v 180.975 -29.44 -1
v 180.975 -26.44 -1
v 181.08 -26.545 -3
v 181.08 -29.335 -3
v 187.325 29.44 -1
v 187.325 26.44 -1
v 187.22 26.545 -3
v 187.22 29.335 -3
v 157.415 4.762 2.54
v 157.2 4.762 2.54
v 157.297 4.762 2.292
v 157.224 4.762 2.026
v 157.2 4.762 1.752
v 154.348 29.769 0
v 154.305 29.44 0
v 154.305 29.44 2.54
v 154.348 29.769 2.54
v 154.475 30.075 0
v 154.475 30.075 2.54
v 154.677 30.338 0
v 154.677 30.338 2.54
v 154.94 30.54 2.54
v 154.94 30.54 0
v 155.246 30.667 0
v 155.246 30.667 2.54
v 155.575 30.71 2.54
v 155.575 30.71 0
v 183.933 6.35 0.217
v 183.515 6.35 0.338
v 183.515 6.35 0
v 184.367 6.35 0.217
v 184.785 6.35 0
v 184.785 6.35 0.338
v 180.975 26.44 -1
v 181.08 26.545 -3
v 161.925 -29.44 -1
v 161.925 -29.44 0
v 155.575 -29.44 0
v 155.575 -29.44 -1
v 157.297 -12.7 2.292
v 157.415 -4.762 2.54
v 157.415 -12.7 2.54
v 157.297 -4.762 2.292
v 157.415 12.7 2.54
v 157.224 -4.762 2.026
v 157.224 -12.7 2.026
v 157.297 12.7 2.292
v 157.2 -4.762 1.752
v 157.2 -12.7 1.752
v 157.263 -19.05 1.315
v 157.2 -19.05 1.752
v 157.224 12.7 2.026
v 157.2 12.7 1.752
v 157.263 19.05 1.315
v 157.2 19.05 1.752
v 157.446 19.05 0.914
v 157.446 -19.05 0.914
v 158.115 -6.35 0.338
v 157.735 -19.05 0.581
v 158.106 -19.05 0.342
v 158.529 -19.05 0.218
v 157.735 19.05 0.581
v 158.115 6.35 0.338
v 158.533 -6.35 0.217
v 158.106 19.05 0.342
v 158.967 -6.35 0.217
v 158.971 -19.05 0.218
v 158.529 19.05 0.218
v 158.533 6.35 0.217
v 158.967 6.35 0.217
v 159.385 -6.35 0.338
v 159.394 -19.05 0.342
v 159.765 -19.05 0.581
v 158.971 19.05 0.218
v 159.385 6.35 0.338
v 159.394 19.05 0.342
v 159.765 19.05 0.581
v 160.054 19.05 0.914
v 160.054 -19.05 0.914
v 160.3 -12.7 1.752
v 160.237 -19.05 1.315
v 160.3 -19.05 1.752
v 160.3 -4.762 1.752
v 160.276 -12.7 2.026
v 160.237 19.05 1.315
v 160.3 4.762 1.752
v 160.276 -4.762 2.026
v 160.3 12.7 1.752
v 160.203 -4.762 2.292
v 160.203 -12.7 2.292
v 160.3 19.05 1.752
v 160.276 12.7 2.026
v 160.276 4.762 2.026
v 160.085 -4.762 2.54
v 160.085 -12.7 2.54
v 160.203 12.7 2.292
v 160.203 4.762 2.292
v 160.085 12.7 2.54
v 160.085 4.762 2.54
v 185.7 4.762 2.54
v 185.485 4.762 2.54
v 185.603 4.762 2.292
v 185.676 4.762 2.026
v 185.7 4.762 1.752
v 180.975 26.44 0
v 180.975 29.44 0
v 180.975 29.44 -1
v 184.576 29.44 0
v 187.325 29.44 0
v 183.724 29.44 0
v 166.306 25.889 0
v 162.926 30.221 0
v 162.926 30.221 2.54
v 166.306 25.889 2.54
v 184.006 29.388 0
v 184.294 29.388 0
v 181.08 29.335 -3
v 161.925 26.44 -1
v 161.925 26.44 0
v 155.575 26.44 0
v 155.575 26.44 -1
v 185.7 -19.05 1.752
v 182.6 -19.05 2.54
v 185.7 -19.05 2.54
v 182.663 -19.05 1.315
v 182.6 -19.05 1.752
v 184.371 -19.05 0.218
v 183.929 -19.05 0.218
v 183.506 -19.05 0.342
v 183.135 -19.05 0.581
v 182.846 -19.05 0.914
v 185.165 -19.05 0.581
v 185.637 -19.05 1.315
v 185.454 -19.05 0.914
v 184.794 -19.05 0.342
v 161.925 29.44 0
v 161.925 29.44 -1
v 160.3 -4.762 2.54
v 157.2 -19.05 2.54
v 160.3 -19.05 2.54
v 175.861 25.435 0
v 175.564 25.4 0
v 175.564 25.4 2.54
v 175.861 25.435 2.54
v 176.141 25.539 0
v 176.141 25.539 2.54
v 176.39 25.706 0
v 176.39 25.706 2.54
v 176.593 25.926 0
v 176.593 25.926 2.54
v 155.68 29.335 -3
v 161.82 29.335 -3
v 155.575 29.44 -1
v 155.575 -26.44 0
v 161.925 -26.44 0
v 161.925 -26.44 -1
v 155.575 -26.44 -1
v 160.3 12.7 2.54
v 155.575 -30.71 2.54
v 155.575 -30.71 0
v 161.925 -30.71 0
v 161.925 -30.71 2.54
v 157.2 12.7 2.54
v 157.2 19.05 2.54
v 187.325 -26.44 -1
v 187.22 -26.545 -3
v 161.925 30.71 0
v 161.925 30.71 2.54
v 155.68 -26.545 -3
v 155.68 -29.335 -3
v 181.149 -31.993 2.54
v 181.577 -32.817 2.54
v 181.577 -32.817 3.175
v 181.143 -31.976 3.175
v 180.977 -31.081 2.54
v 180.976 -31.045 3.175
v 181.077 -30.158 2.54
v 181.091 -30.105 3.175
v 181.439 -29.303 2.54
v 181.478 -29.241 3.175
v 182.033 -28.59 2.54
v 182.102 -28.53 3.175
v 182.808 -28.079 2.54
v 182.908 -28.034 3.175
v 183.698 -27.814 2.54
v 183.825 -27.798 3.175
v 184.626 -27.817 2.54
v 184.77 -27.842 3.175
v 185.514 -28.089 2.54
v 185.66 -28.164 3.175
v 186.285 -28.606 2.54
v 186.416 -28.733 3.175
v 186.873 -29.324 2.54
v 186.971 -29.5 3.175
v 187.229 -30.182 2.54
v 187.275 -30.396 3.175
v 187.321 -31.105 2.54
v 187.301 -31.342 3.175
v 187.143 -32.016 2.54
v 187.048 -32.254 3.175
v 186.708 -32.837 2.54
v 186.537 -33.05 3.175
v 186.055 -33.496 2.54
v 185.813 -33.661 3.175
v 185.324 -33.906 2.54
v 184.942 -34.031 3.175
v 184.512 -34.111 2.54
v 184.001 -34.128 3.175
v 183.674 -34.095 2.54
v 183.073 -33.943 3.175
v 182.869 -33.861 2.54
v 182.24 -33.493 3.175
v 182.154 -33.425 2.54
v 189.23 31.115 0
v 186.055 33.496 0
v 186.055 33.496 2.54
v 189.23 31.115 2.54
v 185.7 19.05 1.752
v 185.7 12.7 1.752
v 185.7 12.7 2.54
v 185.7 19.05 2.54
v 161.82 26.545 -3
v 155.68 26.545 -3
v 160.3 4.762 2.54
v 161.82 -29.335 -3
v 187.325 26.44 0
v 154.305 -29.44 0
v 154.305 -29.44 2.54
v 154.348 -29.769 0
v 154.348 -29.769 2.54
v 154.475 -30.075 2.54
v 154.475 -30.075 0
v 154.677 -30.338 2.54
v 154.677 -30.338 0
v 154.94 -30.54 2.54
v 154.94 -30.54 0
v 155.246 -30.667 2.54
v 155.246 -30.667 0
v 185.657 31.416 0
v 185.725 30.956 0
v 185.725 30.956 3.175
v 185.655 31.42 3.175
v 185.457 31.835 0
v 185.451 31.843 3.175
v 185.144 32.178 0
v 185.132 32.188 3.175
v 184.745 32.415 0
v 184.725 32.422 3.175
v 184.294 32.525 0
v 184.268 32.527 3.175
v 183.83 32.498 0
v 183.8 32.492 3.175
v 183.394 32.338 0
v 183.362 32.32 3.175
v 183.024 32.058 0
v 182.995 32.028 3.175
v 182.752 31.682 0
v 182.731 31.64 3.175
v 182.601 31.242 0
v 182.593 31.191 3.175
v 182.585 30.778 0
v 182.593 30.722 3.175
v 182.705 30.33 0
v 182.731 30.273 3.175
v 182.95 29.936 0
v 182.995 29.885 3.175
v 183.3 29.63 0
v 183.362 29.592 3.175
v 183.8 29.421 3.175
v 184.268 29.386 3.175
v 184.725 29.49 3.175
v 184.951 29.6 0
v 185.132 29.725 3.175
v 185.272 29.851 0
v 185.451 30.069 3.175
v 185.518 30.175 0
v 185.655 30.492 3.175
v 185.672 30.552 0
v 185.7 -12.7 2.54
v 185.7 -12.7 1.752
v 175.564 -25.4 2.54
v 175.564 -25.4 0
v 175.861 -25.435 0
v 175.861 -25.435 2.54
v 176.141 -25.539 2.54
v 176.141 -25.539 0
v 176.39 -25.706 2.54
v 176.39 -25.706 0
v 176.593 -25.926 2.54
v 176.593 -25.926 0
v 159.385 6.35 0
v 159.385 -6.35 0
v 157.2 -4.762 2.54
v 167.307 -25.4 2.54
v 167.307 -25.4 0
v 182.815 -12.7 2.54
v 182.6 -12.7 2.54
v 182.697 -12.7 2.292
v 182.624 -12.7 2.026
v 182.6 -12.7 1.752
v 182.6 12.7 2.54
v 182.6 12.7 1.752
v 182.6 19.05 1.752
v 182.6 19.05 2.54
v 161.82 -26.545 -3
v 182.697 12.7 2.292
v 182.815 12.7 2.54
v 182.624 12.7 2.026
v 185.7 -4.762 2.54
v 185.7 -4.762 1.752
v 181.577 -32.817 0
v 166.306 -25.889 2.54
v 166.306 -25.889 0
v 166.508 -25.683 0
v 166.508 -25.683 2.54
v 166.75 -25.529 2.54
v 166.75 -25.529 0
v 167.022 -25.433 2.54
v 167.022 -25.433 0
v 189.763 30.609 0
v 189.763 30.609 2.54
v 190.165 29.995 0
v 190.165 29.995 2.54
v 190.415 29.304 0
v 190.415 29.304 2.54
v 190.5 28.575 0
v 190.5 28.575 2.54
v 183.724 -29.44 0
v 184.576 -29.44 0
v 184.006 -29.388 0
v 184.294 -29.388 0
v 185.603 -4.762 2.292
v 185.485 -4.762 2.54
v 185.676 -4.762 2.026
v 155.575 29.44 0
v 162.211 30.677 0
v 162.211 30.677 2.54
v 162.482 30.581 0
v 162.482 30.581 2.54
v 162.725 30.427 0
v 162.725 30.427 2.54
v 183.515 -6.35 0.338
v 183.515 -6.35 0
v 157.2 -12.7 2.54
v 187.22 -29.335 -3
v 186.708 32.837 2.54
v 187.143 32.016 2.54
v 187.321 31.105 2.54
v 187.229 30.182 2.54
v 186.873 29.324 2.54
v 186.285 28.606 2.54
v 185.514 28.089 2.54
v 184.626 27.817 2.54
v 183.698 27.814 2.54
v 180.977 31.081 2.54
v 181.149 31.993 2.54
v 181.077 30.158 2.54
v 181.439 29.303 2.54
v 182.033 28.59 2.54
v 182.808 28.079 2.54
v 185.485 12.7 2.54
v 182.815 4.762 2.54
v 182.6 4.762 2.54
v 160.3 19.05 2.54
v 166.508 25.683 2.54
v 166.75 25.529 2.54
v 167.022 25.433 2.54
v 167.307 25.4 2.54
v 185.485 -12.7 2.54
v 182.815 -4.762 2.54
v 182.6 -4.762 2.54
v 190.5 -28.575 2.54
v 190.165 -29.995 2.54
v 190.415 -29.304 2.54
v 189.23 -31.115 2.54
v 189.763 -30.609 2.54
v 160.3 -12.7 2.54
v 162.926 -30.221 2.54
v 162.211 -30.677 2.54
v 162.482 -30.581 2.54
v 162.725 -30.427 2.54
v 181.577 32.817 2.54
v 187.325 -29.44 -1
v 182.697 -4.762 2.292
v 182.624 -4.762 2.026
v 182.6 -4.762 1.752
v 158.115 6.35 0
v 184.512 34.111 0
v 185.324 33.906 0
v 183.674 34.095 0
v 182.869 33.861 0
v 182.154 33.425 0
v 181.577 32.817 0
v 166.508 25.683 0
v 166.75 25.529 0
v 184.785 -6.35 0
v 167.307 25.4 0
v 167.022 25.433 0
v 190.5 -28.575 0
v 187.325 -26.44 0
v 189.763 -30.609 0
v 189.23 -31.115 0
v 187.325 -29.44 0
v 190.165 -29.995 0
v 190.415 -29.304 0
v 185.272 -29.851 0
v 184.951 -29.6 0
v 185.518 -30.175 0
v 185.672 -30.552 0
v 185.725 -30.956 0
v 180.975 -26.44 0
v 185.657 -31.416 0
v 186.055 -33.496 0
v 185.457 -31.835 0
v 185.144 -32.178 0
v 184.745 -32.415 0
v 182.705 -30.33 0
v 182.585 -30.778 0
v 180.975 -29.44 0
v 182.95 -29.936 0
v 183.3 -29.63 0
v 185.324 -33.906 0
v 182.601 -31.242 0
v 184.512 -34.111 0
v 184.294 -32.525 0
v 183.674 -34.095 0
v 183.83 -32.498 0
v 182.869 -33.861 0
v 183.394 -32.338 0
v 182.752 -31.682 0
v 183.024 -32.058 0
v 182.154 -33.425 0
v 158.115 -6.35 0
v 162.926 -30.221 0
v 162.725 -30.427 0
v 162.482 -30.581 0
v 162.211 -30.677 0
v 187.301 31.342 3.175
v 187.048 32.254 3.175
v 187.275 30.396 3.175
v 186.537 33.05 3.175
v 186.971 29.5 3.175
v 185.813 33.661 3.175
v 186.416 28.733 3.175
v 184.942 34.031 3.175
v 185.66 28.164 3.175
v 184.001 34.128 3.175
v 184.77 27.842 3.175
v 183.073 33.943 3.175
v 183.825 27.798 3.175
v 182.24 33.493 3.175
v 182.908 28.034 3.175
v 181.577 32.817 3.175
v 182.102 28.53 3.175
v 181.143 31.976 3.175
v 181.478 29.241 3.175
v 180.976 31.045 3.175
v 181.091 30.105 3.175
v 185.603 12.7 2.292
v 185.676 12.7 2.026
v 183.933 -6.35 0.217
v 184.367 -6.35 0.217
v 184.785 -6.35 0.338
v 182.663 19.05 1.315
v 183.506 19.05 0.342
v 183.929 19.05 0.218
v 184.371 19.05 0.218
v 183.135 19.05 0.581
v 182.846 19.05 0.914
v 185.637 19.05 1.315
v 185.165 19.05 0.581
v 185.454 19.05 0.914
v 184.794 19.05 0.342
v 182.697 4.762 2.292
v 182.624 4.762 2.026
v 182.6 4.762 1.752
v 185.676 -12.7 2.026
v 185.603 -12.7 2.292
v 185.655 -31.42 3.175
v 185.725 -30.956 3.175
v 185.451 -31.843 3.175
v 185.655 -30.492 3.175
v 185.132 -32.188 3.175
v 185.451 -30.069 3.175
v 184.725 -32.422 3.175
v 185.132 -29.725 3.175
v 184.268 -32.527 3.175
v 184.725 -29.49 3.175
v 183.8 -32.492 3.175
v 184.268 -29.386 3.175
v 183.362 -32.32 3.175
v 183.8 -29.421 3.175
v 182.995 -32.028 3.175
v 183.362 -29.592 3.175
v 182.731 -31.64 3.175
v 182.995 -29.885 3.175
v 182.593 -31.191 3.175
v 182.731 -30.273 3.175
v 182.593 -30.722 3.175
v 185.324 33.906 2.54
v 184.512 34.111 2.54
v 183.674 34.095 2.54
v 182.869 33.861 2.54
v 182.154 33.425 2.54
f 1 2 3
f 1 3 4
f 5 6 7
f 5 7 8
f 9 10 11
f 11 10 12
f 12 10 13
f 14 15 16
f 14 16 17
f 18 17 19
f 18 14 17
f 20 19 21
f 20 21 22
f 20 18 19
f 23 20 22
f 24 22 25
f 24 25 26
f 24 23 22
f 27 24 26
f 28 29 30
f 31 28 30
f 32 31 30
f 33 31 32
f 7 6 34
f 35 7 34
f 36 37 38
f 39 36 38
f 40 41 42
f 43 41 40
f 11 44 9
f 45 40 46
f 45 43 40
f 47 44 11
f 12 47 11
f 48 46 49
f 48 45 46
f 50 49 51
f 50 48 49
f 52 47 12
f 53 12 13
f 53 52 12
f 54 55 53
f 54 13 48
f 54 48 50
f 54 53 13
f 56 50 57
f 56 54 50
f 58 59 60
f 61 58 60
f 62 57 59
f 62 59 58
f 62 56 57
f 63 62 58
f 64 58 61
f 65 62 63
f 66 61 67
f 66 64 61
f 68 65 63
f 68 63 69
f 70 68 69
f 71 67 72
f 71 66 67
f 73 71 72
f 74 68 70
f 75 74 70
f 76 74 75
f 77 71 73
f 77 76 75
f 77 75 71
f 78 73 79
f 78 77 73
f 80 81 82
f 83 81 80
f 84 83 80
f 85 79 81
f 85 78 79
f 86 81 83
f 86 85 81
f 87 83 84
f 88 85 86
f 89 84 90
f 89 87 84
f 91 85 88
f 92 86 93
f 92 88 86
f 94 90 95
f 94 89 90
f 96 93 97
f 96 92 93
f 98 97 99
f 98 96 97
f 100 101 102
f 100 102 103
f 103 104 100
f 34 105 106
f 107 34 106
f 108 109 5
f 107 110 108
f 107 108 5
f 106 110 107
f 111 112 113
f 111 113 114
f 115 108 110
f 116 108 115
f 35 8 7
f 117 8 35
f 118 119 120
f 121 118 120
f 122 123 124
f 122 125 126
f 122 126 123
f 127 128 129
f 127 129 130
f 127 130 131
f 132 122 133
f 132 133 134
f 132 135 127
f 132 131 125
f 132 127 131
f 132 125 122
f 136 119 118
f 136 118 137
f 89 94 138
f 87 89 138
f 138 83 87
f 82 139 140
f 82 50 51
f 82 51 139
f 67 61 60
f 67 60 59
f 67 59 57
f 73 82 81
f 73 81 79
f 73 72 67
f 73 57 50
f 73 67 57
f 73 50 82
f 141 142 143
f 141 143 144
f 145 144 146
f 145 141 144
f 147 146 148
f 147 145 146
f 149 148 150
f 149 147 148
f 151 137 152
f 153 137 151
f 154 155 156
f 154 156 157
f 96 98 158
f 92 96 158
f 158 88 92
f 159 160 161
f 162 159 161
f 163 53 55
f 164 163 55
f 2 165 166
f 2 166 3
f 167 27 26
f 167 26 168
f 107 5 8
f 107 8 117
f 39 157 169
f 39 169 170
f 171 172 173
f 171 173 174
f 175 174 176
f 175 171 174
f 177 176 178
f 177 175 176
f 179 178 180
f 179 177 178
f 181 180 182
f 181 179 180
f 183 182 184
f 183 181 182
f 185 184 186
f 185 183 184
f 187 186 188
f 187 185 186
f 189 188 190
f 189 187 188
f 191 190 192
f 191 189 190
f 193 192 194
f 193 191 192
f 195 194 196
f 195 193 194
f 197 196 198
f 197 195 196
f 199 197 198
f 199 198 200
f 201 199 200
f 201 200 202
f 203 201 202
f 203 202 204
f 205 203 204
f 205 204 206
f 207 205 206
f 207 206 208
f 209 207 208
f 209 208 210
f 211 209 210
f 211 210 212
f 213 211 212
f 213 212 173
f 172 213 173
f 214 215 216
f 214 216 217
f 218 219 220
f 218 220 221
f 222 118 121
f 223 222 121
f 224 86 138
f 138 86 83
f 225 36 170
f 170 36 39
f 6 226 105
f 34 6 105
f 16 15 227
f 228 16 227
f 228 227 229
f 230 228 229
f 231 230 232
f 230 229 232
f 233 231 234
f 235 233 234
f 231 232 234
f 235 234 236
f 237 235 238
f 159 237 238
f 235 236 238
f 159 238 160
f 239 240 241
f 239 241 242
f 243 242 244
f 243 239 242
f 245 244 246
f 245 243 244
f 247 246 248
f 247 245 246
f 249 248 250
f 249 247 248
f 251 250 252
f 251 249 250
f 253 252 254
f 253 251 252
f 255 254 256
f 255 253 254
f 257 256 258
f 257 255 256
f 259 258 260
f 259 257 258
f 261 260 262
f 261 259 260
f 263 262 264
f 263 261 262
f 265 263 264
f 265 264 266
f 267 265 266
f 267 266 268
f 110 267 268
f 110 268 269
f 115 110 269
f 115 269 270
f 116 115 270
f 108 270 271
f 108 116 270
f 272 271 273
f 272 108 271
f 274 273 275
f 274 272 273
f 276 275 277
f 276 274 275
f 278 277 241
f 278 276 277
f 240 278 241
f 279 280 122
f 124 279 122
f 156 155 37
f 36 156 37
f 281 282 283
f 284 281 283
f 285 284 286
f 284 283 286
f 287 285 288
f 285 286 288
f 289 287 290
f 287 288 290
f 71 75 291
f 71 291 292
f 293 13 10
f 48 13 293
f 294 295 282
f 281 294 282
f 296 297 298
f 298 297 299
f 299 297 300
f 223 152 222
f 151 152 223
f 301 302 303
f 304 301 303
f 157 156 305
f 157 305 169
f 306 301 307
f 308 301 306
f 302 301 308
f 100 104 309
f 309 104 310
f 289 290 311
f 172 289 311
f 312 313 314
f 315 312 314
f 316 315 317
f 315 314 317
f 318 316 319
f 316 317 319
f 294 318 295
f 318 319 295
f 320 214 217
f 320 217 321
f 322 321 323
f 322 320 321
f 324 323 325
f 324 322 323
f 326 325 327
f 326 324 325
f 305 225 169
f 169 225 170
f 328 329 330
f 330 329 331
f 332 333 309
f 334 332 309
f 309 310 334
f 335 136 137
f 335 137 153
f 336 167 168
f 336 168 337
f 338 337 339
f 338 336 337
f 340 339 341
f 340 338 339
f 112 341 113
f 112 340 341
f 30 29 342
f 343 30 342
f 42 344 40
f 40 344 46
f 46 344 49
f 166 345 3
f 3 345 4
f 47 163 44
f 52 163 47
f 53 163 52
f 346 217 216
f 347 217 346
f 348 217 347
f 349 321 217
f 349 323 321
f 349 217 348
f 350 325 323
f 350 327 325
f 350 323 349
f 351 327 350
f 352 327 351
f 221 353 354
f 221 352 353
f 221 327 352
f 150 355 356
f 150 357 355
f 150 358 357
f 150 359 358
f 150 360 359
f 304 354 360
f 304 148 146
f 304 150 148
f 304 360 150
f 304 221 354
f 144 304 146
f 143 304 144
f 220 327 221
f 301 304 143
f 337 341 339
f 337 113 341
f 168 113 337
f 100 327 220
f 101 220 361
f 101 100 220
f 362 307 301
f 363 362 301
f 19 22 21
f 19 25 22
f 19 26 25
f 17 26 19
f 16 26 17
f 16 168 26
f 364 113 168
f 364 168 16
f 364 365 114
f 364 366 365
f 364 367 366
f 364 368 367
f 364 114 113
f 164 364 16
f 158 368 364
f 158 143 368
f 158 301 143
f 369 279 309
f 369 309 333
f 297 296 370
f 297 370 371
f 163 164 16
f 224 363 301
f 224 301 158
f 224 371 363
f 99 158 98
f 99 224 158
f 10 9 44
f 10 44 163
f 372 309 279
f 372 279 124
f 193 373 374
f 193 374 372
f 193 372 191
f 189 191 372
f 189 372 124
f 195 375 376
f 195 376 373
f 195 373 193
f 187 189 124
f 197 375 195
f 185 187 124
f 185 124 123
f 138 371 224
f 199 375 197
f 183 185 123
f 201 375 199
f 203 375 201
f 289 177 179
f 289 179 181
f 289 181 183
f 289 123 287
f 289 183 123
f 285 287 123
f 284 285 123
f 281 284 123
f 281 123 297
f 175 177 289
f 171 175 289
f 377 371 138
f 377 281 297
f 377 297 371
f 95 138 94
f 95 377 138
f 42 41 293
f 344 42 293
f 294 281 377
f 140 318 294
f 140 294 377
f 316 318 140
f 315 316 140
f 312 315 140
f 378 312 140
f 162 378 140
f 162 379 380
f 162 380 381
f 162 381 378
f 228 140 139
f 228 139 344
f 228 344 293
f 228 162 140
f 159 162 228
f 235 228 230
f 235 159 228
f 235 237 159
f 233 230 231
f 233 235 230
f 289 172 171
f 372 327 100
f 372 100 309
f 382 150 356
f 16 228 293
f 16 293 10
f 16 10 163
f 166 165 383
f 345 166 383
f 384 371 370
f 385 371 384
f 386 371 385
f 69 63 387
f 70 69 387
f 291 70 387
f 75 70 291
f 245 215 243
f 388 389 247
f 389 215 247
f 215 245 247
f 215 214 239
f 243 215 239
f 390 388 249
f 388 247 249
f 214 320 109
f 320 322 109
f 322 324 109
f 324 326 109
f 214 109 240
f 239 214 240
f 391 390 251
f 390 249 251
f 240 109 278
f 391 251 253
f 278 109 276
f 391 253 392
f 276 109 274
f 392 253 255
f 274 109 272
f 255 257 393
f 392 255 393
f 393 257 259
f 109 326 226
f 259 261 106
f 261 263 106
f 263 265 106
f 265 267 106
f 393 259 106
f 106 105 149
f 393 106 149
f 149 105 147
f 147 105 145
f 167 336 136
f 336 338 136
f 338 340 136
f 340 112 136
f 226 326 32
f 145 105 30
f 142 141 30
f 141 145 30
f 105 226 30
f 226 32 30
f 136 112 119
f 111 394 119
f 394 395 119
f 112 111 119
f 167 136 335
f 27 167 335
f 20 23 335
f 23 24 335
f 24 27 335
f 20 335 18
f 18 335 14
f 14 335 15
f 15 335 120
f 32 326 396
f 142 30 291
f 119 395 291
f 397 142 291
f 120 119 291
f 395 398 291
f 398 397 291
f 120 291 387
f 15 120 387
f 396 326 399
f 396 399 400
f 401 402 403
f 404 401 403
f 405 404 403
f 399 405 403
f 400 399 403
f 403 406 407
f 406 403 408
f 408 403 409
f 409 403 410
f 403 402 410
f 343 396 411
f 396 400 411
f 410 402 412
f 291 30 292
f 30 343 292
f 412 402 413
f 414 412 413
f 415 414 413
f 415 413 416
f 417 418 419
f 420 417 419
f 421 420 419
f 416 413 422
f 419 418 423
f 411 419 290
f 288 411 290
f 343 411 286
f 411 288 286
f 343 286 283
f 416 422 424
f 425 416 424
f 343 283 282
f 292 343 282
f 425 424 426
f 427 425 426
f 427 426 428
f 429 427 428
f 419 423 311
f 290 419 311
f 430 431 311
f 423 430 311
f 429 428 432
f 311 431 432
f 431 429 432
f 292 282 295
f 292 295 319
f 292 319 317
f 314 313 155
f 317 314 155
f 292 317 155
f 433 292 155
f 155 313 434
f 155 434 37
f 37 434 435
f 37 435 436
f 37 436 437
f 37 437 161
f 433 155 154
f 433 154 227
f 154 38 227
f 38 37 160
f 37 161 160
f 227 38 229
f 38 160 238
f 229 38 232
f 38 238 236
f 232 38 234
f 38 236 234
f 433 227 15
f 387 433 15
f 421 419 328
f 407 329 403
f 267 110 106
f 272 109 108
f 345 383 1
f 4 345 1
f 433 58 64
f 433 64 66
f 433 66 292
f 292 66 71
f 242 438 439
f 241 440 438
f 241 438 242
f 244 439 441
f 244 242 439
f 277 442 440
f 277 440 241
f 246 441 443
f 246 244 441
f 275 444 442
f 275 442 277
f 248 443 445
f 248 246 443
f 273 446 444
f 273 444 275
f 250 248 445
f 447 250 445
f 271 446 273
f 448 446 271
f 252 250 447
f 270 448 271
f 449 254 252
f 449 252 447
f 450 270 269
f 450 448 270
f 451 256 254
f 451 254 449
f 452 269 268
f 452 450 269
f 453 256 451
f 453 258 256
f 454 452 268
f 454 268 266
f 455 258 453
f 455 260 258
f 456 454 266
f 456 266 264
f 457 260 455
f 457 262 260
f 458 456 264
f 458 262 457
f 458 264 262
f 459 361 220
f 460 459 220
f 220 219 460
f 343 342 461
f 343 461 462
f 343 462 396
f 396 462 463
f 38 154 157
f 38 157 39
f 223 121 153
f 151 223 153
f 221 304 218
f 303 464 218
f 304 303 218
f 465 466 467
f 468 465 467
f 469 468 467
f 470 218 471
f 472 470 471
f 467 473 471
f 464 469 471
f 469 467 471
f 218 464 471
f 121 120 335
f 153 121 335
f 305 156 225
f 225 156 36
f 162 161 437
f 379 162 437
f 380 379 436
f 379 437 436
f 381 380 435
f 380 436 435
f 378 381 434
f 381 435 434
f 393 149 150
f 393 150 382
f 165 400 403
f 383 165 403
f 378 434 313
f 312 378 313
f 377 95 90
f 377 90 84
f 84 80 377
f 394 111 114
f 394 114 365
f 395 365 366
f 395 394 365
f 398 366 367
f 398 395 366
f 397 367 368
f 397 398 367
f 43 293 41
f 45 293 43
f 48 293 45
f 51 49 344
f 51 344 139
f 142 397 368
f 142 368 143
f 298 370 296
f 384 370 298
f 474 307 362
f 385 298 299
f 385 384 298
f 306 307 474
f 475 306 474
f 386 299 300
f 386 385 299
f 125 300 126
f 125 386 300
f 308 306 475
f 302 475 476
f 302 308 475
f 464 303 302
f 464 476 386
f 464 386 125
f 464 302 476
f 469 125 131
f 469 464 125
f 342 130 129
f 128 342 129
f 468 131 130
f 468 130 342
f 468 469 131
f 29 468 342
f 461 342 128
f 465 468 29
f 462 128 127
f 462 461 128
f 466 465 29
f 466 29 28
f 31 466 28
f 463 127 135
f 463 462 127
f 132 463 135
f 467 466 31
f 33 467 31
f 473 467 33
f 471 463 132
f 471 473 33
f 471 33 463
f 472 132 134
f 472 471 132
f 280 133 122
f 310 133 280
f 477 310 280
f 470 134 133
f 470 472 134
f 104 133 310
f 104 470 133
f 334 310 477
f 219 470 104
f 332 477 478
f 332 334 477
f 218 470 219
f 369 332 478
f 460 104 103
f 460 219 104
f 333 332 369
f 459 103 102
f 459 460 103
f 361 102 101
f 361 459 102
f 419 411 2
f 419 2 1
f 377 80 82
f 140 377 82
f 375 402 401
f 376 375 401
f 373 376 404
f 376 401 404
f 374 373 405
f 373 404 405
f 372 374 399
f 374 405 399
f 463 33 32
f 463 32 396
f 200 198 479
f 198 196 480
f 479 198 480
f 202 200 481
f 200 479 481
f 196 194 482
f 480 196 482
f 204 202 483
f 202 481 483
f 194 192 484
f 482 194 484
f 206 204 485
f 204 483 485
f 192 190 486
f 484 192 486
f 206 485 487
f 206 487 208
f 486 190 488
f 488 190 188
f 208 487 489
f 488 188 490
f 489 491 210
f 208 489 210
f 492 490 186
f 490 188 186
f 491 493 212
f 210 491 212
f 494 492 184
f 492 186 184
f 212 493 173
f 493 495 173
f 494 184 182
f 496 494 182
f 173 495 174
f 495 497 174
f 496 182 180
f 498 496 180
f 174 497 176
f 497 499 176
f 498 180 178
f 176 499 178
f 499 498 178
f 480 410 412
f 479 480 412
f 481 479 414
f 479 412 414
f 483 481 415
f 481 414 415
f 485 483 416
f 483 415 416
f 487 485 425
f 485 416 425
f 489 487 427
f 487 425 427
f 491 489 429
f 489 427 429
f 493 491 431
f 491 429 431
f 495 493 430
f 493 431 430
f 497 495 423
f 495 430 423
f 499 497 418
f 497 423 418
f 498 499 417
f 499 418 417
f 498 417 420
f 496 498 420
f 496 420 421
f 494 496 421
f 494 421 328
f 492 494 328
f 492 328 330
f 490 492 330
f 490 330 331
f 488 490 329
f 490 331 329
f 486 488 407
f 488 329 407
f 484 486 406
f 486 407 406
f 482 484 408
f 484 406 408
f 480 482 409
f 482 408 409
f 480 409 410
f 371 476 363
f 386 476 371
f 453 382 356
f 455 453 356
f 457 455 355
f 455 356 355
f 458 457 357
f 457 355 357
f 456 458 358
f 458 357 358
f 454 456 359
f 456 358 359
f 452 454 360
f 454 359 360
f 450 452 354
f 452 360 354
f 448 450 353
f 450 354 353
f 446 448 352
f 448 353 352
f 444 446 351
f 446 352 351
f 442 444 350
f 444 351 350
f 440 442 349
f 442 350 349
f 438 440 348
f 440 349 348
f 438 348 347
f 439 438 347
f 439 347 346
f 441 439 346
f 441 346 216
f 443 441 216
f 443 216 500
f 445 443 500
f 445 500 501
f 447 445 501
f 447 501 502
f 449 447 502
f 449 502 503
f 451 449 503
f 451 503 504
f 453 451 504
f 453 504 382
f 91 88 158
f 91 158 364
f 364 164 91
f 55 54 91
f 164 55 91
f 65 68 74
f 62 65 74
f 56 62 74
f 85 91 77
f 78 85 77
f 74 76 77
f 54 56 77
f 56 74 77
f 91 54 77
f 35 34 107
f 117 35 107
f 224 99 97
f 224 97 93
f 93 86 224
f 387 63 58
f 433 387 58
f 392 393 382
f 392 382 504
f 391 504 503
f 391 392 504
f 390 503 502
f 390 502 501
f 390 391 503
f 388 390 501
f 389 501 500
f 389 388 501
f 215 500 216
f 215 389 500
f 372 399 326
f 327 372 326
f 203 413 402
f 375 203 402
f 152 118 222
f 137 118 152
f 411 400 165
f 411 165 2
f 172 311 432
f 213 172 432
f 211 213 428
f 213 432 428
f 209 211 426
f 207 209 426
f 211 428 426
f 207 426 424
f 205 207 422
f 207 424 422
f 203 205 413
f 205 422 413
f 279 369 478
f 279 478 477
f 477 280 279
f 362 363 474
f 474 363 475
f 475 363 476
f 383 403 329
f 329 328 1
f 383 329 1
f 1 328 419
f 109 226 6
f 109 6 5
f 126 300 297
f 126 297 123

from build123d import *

# Parameters (mm, degrees)
SKETCH2_R                     = 1.575
BOSS_EXTRUDE1_DEPTH           = 2.54
SKETCH3_R                     = 3.175
SKETCH3_R_2                   = 1.575
BOSS_EXTRUDE2_DEPTH           = 0.635
SKETCH4_W                     = 6.35
SKETCH4_H                     = 3
BOSS_EXTRUDE3_DEPTH           = 1
SKETCH5_W                     = 6.35
SKETCH5_H                     = 3
BOSS_EXTRUDE4_DEPTH           = 2
BOSS_EXTRUDE4_DRAFT           = 3
BOSS_EXTRUDE4_PROFILE_2_DEPTH = 2
BOSS_EXTRUDE4_PROFILE_2_DRAFT = 3
SKETCH6_R                     = 1.55
CUT_EXTRUDE1_DEPTH            = 19.05
CUT_EXTRUDE2_START            = -0.788
SKETCH7_W                     = 3.1
SKETCH7_H                     = 6.35
SKETCH7_H_2                   = 4.7625
CUT_EXTRUDE2_DEPTH            = 0.788
CUT_EXTRUDE3_REACH            = 195.613
SKETCH8_W                     = 1.27
SKETCH8_H                     = 6.35
LPATTERN1_COUNT               = 2
LPATTERN1_PITCH               = 25.4


with BuildPart() as part:
    # Sketch2 → Boss-Extrude1 (new body)
    with BuildSketch(Plane.XY):
        with BuildLine():
            Line((186.055, 33.49625), (189.23, 31.115))
            ThreePointArc((189.23, 31.115), (190.164806331, 29.994903166), (190.5, 28.575))
            Line((190.5, 28.575), (190.5, 0))
            Line((190.5, 0), (154.305, 0))
            Line((154.305, 0), (154.305, 29.44))
            ThreePointArc((154.305, 29.44), (154.676974388, 30.338025612), (155.575, 30.71))
            Line((155.575, 30.71), (161.925, 30.71))
            ThreePointArc((161.925, 30.71), (162.482139282, 30.58126939), (162.926332297, 30.221174521))
            Line((162.926332297, 30.221174521), (166.306150062, 25.888825479))
            ThreePointArc((166.306150062, 25.888825479), (166.750343077, 25.52873061), (167.307482358, 25.4))
            Line((167.307482358, 25.4), (175.563715168, 25.4))
            ThreePointArc((175.563715168, 25.4), (176.141475824, 25.539030228), (176.592738534, 25.925680906))
            Line((176.592738534, 25.925680906), (181.577441586, 32.817047734))
            ThreePointArc((181.577441586, 32.817047734), (183.673830399, 34.095340236), (186.055, 33.49625))
        make_face()
        with Locations((184.15, 30.95625)):
            Circle(SKETCH2_R, mode=Mode.SUBTRACT)
    extrude(amount=BOSS_EXTRUDE1_DEPTH)

    # Sketch3 → Boss-Extrude2 (add)
    with BuildSketch(Plane.XY.offset(2.54)):
        with Locations(Location((184.15, 30.95625, 0), (0, 0, 144.120815799))):
            Circle(SKETCH3_R)
        with Locations((184.15, 30.95625)):
            Circle(SKETCH3_R_2, mode=Mode.SUBTRACT)
    extrude(amount=BOSS_EXTRUDE2_DEPTH)

    # Sketch4 → Boss-Extrude3 (add)
    with BuildSketch(Plane(origin=(0, 0, 0), x_dir=(-1, 0, 0), z_dir=(0, 0, -1))):
        with Locations((-184.15, 27.94)):
            Rectangle(SKETCH4_W, SKETCH4_H)
        with Locations((-158.75, 27.94)):
            Rectangle(SKETCH4_W, SKETCH4_H)
    extrude(amount=BOSS_EXTRUDE3_DEPTH)


with BuildPart() as boss_extrude4_tool:
    # Sketch5 → Boss-Extrude4 (with draft: the straight prism first)
    with BuildSketch(Plane(origin=(0, 0, -1), x_dir=(-1, 0, 0), z_dir=(0, 0, -1))):
        with Locations((-158.75, 27.94)):
            Rectangle(SKETCH5_W, SKETCH5_H)
    extrude(amount=BOSS_EXTRUDE4_DEPTH)
    # Boss-Extrude4: the draft: its side faces are tilted about the plane it starts from
    boss_extrude4_sides = [boss_extrude4_tool.faces().sort_by_distance(p)[0] for p in [
        (155.575, 27.94, -2),
        (158.75, 29.44, -2),
        (161.925, 27.94, -2),
        (158.75, 26.44, -2),
    ]]
    draft(boss_extrude4_sides, Plane(origin=(0, 0, -1), x_dir=(-1, 0, 0), z_dir=(0, 0, -1)), BOSS_EXTRUDE4_DRAFT)


with BuildPart() as part_1:
    add(part.part)

    # Boss-Extrude4: add boss_extrude4_tool
    add(boss_extrude4_tool.part)


with BuildPart() as boss_extrude4_profile_2_tool:
    # Sketch5 → Boss-Extrude4 profile 2 (with draft: the straight prism first)
    with BuildSketch(Plane(origin=(0, 0, -1), x_dir=(-1, 0, 0), z_dir=(0, 0, -1))):
        with Locations((-184.15, 27.94)):
            Rectangle(SKETCH5_W, SKETCH5_H)
    extrude(amount=BOSS_EXTRUDE4_PROFILE_2_DEPTH)
    # Boss-Extrude4 profile 2: the draft: its side faces are tilted about the plane it starts from
    boss_extrude4_profile_2_sides = [boss_extrude4_profile_2_tool.faces().sort_by_distance(p)[0] for p in [
        (180.975, 27.94, -2),
        (184.15, 29.44, -2),
        (187.325, 27.94, -2),
        (184.15, 26.44, -2),
    ]]
    draft(boss_extrude4_profile_2_sides, Plane(origin=(0, 0, -1), x_dir=(-1, 0, 0), z_dir=(0, 0, -1)), BOSS_EXTRUDE4_PROFILE_2_DRAFT)


with BuildPart() as part_2:
    add(part_1.part)

    # Boss-Extrude4 profile 2: add boss_extrude4_profile_2_tool
    add(boss_extrude4_profile_2_tool.part)

    # Sketch6 → Cut-Extrude1 (cut)
    with BuildSketch(Plane.XZ):
        with Locations((184.15, 1.752)):
            Circle(SKETCH6_R)
    cut_extrude1 = extrude(amount=-CUT_EXTRUDE1_DEPTH, mode=Mode.SUBTRACT)

    # Sketch7 → Cut-Extrude2 (cut)
    with BuildSketch(Plane.XY.offset(2.54).offset(CUT_EXTRUDE2_START)):
        with Locations((184.15, 15.875)):
            Rectangle(SKETCH7_W, SKETCH7_H)
        with Locations((184.15, 2.38125)):
            Rectangle(SKETCH7_W, SKETCH7_H_2)
    cut_extrude2 = extrude(amount=CUT_EXTRUDE2_DEPTH, mode=Mode.SUBTRACT)

    # Sketch8 → Cut-Extrude3 (cut, up to next)
    with BuildSketch(Plane.XY.offset(2.54), mode=Mode.PRIVATE) as cut_extrude3_sk1:
        with Locations((184.15, 3.175)):
            Rectangle(SKETCH8_W, SKETCH8_H)
    cut_extrude3_tool1 = extrude(cut_extrude3_sk1.sketch, amount=-CUT_EXTRUDE3_REACH, mode=Mode.PRIVATE) & part_2.part
    cut_extrude3 = cut_extrude3_tool1.solids().sort_by_distance((184.15, 3.175, 2.54))[0]
    add(cut_extrude3, mode=Mode.SUBTRACT)

    # LPattern1: Cut-Extrude1, Cut-Extrude2, Cut-Extrude3 ×2
    with Locations(*[(-i * LPATTERN1_PITCH, 0, 0) for i in range(1, LPATTERN1_COUNT)]):
        add(cut_extrude1, mode=Mode.SUBTRACT)
        add(cut_extrude2, mode=Mode.SUBTRACT)
        add(cut_extrude3, mode=Mode.SUBTRACT)

    # Mirror1: part across plane


with BuildPart() as part_3:
    add(part_2.part)
    add(part_2.part.mirror(Plane.ZX))


solid = part_3.part
